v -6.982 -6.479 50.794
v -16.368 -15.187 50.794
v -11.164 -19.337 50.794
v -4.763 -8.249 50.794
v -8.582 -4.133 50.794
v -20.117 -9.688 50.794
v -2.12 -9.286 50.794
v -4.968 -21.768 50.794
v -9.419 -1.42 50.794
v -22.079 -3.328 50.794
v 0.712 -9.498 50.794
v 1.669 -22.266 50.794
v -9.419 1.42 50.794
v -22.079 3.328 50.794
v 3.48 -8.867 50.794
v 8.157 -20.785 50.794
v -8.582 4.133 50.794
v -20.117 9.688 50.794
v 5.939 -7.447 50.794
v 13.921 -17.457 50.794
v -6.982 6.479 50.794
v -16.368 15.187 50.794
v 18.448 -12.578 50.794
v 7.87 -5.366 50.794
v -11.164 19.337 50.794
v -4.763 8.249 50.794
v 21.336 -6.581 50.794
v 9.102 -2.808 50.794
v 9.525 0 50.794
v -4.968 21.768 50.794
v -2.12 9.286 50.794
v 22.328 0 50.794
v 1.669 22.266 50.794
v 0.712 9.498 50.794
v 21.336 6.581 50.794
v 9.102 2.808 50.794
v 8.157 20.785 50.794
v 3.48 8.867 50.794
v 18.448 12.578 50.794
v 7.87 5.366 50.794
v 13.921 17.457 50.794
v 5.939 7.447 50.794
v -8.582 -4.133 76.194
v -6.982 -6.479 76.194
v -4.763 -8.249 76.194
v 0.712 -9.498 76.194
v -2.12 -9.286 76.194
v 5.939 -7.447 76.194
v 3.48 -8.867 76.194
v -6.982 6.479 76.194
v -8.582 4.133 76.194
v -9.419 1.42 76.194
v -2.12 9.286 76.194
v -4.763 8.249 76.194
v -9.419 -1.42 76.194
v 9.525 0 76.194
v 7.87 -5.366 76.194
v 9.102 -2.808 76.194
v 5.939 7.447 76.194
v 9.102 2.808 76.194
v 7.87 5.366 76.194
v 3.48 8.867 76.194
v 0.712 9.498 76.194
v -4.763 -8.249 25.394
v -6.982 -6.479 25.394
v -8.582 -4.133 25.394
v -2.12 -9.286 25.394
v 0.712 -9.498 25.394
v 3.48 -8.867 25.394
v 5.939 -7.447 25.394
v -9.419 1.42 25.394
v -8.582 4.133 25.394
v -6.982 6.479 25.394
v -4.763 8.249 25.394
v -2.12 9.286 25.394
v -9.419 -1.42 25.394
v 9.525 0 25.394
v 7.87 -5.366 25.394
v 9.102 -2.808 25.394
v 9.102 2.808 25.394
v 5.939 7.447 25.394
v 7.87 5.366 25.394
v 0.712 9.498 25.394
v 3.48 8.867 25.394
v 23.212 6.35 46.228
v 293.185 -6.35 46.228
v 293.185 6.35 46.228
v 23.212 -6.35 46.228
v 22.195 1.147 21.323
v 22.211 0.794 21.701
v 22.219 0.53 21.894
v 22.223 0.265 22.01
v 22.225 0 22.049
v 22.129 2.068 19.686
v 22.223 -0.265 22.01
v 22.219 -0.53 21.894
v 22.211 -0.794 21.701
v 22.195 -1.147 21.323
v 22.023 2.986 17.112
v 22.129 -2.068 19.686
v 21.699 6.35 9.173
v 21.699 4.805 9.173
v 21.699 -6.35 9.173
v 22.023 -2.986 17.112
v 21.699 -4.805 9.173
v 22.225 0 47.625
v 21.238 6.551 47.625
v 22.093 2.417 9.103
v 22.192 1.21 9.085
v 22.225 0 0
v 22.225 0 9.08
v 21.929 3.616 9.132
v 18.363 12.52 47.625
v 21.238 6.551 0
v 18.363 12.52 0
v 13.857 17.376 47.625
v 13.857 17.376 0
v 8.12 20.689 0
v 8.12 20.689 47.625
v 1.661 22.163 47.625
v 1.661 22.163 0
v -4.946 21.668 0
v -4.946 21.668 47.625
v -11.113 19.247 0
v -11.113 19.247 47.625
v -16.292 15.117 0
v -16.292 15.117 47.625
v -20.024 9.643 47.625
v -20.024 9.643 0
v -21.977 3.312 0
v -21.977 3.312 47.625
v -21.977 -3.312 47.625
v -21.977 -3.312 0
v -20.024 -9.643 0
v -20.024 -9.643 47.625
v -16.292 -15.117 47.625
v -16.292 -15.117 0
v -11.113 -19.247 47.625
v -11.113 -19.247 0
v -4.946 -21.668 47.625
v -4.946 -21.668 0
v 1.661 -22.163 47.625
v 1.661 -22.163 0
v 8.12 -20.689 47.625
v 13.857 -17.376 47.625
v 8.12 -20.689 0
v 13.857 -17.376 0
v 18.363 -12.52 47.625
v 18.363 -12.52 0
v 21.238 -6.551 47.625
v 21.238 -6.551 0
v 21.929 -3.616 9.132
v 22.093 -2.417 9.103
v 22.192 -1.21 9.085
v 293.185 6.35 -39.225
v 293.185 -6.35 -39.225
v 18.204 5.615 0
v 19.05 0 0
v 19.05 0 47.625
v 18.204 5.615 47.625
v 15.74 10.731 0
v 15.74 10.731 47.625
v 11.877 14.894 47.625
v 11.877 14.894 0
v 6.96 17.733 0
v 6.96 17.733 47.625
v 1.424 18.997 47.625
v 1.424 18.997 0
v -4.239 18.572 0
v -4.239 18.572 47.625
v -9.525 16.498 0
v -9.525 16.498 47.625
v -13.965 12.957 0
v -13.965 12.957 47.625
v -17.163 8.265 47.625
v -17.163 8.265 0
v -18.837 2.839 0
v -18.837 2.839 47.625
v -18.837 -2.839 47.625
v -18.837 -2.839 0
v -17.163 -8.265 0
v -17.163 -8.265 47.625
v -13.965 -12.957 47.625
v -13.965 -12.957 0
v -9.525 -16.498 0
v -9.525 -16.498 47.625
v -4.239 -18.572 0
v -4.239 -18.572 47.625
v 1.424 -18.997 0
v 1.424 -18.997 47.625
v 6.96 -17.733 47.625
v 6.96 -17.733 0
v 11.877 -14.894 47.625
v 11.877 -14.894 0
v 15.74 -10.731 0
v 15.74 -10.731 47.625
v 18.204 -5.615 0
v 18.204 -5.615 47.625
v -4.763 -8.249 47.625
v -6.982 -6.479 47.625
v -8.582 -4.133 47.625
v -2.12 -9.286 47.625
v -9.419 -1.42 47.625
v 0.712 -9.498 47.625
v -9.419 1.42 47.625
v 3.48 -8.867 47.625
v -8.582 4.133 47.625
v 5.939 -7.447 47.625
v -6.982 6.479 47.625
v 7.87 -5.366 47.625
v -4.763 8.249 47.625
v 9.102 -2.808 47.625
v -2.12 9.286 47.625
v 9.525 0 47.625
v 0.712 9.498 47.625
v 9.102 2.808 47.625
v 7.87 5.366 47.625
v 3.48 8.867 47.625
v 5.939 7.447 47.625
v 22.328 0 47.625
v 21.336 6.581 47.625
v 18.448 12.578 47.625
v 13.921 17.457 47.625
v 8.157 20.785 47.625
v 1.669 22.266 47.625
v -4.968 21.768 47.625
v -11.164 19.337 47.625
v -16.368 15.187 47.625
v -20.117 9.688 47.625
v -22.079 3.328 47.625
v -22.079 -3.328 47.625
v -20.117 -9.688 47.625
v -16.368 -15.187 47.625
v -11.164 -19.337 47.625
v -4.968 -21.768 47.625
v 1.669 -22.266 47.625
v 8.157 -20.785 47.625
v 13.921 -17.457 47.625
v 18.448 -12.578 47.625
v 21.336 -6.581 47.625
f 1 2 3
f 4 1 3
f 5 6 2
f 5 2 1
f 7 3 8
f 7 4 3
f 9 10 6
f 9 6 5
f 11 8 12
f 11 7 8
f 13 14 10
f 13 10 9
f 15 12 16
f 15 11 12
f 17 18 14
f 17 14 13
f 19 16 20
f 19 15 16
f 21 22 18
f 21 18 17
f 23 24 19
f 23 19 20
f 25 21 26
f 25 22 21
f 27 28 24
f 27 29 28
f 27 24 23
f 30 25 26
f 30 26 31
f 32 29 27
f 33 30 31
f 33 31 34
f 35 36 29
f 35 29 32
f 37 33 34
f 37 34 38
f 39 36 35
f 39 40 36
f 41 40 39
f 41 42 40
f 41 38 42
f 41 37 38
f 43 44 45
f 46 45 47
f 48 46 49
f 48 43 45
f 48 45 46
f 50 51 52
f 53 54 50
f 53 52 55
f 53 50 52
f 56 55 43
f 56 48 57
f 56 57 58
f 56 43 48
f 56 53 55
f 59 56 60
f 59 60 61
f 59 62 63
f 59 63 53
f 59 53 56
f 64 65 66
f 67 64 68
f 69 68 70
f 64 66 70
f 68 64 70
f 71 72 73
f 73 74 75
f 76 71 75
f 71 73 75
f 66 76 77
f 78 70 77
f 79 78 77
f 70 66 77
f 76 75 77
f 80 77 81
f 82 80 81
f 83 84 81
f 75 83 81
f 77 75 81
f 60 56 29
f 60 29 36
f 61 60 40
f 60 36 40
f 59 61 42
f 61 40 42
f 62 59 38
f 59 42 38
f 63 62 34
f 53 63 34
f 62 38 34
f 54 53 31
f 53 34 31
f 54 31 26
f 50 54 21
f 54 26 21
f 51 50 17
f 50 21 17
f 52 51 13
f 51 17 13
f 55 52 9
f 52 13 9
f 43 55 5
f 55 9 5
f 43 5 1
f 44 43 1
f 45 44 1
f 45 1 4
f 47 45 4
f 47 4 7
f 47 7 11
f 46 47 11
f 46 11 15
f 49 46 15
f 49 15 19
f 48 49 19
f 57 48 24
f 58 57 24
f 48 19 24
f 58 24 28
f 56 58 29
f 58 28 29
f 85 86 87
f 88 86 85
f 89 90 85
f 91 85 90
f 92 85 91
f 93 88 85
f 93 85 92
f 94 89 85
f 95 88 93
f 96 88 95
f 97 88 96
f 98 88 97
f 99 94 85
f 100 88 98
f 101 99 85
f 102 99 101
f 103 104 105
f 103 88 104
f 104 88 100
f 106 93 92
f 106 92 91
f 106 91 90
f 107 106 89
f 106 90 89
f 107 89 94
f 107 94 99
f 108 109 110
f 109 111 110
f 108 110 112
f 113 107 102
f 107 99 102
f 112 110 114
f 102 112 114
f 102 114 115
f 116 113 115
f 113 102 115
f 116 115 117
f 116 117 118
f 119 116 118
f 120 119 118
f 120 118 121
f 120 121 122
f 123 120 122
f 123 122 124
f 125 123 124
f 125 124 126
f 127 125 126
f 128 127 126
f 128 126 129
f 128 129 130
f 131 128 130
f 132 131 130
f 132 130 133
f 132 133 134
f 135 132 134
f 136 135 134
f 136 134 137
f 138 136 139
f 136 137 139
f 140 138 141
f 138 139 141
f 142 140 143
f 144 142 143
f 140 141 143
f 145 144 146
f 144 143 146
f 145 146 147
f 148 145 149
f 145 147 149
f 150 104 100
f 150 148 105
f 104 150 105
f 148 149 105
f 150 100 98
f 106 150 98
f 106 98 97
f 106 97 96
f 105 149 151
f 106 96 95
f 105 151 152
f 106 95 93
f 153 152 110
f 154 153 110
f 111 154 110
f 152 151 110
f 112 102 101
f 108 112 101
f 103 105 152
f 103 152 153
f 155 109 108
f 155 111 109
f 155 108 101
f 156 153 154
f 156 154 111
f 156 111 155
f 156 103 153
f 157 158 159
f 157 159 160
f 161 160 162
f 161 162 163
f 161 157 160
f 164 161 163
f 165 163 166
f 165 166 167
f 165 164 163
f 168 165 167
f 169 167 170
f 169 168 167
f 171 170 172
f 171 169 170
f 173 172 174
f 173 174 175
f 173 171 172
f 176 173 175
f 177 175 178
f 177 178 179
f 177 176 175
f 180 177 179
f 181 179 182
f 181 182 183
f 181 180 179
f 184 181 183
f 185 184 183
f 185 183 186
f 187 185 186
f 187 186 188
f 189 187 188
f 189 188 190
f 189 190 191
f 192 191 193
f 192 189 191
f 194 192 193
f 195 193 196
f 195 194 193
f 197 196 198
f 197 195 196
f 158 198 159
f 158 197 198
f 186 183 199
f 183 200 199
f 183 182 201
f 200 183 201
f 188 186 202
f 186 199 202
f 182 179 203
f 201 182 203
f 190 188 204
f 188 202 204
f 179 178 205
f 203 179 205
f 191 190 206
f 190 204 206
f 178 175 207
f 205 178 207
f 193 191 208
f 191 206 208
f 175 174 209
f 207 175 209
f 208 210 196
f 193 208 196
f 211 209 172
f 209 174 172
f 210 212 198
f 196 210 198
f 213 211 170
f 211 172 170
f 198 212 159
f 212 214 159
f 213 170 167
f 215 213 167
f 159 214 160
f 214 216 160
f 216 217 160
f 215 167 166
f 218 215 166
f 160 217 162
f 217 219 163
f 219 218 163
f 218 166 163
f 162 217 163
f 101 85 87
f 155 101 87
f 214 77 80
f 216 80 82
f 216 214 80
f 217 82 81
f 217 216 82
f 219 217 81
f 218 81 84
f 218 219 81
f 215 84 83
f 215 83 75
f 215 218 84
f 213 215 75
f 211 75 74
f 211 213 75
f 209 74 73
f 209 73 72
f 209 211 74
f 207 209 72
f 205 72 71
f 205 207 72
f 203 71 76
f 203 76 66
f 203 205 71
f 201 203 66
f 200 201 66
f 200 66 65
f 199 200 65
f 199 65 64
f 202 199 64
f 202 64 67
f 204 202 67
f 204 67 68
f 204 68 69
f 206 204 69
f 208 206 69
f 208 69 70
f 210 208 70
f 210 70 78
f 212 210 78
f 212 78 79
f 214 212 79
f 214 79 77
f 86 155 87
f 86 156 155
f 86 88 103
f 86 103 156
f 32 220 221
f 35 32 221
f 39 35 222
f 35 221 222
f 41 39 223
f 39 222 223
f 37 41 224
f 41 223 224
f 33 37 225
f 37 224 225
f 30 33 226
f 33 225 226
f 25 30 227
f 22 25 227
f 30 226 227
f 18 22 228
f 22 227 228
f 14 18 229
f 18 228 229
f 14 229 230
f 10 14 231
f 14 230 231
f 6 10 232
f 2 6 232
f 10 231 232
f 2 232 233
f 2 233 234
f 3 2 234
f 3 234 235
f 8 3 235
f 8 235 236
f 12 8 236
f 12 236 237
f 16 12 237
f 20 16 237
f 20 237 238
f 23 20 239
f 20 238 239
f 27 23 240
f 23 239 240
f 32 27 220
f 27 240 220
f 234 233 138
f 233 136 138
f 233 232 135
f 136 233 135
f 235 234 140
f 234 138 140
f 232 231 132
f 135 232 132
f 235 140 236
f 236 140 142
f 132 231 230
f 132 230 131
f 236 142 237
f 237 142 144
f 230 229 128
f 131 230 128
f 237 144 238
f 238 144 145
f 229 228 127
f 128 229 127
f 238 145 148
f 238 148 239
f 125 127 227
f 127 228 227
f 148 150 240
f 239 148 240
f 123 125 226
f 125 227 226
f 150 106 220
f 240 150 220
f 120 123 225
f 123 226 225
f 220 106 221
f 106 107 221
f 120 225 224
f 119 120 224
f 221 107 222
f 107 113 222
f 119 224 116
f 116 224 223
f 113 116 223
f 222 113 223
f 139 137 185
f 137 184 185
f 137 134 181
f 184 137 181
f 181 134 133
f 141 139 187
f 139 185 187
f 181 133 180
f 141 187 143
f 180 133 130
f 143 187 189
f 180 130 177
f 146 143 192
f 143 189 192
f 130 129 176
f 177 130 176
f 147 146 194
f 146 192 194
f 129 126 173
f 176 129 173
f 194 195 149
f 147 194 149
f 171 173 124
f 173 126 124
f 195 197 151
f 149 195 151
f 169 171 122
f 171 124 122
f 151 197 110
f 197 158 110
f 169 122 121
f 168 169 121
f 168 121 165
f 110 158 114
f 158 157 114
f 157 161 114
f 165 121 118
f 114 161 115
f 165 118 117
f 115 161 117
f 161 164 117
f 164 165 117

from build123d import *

# Parameters (mm, degrees)
F0_R          = 22.225
F0_R_2        = 19.05
F1_DEPTH      = 47.625
F2_R          = 22.328019
F3_DEPTH      = 3.16947
F4_R          = 9.525
F5_DEPTH      = 25.4
F5_DEPTH_BACK = 25.4
F7_DEPTH      = 6.35
F7_DEPTH_BACK = 6.35


with BuildPart() as f1:
    # F0 (on Top) → F1 (new body)
    with BuildSketch(Plane.XY):
        Circle(F0_R)
        Circle(F0_R_2, mode=Mode.SUBTRACT)
    extrude(amount=F1_DEPTH)

    # F2 (on face) → F3 (join)
    with BuildSketch(Plane.XY.offset(47.625)):
        Circle(F2_R)
    extrude(amount=F3_DEPTH)

    # F4 (on face) → F5 (join, two sides)
    with BuildSketch(Plane.XY.offset(50.79447)) as f5_sk:
        Circle(F4_R)
    extrude(amount=F5_DEPTH)
    extrude(f5_sk.sketch, amount=-F5_DEPTH_BACK)

    # F6 (on Front) → F7 (join, two sides)
    with BuildSketch(Plane.XZ) as f7_sk:
        Polygon((293.185323, 46.228472), (23.211915, 46.228472), (21.699471, 9.1733), (293.185323, -39.225295), align=None)
    extrude(amount=F7_DEPTH)
    extrude(f7_sk.sketch, amount=-F7_DEPTH_BACK)


solid = f1.part
